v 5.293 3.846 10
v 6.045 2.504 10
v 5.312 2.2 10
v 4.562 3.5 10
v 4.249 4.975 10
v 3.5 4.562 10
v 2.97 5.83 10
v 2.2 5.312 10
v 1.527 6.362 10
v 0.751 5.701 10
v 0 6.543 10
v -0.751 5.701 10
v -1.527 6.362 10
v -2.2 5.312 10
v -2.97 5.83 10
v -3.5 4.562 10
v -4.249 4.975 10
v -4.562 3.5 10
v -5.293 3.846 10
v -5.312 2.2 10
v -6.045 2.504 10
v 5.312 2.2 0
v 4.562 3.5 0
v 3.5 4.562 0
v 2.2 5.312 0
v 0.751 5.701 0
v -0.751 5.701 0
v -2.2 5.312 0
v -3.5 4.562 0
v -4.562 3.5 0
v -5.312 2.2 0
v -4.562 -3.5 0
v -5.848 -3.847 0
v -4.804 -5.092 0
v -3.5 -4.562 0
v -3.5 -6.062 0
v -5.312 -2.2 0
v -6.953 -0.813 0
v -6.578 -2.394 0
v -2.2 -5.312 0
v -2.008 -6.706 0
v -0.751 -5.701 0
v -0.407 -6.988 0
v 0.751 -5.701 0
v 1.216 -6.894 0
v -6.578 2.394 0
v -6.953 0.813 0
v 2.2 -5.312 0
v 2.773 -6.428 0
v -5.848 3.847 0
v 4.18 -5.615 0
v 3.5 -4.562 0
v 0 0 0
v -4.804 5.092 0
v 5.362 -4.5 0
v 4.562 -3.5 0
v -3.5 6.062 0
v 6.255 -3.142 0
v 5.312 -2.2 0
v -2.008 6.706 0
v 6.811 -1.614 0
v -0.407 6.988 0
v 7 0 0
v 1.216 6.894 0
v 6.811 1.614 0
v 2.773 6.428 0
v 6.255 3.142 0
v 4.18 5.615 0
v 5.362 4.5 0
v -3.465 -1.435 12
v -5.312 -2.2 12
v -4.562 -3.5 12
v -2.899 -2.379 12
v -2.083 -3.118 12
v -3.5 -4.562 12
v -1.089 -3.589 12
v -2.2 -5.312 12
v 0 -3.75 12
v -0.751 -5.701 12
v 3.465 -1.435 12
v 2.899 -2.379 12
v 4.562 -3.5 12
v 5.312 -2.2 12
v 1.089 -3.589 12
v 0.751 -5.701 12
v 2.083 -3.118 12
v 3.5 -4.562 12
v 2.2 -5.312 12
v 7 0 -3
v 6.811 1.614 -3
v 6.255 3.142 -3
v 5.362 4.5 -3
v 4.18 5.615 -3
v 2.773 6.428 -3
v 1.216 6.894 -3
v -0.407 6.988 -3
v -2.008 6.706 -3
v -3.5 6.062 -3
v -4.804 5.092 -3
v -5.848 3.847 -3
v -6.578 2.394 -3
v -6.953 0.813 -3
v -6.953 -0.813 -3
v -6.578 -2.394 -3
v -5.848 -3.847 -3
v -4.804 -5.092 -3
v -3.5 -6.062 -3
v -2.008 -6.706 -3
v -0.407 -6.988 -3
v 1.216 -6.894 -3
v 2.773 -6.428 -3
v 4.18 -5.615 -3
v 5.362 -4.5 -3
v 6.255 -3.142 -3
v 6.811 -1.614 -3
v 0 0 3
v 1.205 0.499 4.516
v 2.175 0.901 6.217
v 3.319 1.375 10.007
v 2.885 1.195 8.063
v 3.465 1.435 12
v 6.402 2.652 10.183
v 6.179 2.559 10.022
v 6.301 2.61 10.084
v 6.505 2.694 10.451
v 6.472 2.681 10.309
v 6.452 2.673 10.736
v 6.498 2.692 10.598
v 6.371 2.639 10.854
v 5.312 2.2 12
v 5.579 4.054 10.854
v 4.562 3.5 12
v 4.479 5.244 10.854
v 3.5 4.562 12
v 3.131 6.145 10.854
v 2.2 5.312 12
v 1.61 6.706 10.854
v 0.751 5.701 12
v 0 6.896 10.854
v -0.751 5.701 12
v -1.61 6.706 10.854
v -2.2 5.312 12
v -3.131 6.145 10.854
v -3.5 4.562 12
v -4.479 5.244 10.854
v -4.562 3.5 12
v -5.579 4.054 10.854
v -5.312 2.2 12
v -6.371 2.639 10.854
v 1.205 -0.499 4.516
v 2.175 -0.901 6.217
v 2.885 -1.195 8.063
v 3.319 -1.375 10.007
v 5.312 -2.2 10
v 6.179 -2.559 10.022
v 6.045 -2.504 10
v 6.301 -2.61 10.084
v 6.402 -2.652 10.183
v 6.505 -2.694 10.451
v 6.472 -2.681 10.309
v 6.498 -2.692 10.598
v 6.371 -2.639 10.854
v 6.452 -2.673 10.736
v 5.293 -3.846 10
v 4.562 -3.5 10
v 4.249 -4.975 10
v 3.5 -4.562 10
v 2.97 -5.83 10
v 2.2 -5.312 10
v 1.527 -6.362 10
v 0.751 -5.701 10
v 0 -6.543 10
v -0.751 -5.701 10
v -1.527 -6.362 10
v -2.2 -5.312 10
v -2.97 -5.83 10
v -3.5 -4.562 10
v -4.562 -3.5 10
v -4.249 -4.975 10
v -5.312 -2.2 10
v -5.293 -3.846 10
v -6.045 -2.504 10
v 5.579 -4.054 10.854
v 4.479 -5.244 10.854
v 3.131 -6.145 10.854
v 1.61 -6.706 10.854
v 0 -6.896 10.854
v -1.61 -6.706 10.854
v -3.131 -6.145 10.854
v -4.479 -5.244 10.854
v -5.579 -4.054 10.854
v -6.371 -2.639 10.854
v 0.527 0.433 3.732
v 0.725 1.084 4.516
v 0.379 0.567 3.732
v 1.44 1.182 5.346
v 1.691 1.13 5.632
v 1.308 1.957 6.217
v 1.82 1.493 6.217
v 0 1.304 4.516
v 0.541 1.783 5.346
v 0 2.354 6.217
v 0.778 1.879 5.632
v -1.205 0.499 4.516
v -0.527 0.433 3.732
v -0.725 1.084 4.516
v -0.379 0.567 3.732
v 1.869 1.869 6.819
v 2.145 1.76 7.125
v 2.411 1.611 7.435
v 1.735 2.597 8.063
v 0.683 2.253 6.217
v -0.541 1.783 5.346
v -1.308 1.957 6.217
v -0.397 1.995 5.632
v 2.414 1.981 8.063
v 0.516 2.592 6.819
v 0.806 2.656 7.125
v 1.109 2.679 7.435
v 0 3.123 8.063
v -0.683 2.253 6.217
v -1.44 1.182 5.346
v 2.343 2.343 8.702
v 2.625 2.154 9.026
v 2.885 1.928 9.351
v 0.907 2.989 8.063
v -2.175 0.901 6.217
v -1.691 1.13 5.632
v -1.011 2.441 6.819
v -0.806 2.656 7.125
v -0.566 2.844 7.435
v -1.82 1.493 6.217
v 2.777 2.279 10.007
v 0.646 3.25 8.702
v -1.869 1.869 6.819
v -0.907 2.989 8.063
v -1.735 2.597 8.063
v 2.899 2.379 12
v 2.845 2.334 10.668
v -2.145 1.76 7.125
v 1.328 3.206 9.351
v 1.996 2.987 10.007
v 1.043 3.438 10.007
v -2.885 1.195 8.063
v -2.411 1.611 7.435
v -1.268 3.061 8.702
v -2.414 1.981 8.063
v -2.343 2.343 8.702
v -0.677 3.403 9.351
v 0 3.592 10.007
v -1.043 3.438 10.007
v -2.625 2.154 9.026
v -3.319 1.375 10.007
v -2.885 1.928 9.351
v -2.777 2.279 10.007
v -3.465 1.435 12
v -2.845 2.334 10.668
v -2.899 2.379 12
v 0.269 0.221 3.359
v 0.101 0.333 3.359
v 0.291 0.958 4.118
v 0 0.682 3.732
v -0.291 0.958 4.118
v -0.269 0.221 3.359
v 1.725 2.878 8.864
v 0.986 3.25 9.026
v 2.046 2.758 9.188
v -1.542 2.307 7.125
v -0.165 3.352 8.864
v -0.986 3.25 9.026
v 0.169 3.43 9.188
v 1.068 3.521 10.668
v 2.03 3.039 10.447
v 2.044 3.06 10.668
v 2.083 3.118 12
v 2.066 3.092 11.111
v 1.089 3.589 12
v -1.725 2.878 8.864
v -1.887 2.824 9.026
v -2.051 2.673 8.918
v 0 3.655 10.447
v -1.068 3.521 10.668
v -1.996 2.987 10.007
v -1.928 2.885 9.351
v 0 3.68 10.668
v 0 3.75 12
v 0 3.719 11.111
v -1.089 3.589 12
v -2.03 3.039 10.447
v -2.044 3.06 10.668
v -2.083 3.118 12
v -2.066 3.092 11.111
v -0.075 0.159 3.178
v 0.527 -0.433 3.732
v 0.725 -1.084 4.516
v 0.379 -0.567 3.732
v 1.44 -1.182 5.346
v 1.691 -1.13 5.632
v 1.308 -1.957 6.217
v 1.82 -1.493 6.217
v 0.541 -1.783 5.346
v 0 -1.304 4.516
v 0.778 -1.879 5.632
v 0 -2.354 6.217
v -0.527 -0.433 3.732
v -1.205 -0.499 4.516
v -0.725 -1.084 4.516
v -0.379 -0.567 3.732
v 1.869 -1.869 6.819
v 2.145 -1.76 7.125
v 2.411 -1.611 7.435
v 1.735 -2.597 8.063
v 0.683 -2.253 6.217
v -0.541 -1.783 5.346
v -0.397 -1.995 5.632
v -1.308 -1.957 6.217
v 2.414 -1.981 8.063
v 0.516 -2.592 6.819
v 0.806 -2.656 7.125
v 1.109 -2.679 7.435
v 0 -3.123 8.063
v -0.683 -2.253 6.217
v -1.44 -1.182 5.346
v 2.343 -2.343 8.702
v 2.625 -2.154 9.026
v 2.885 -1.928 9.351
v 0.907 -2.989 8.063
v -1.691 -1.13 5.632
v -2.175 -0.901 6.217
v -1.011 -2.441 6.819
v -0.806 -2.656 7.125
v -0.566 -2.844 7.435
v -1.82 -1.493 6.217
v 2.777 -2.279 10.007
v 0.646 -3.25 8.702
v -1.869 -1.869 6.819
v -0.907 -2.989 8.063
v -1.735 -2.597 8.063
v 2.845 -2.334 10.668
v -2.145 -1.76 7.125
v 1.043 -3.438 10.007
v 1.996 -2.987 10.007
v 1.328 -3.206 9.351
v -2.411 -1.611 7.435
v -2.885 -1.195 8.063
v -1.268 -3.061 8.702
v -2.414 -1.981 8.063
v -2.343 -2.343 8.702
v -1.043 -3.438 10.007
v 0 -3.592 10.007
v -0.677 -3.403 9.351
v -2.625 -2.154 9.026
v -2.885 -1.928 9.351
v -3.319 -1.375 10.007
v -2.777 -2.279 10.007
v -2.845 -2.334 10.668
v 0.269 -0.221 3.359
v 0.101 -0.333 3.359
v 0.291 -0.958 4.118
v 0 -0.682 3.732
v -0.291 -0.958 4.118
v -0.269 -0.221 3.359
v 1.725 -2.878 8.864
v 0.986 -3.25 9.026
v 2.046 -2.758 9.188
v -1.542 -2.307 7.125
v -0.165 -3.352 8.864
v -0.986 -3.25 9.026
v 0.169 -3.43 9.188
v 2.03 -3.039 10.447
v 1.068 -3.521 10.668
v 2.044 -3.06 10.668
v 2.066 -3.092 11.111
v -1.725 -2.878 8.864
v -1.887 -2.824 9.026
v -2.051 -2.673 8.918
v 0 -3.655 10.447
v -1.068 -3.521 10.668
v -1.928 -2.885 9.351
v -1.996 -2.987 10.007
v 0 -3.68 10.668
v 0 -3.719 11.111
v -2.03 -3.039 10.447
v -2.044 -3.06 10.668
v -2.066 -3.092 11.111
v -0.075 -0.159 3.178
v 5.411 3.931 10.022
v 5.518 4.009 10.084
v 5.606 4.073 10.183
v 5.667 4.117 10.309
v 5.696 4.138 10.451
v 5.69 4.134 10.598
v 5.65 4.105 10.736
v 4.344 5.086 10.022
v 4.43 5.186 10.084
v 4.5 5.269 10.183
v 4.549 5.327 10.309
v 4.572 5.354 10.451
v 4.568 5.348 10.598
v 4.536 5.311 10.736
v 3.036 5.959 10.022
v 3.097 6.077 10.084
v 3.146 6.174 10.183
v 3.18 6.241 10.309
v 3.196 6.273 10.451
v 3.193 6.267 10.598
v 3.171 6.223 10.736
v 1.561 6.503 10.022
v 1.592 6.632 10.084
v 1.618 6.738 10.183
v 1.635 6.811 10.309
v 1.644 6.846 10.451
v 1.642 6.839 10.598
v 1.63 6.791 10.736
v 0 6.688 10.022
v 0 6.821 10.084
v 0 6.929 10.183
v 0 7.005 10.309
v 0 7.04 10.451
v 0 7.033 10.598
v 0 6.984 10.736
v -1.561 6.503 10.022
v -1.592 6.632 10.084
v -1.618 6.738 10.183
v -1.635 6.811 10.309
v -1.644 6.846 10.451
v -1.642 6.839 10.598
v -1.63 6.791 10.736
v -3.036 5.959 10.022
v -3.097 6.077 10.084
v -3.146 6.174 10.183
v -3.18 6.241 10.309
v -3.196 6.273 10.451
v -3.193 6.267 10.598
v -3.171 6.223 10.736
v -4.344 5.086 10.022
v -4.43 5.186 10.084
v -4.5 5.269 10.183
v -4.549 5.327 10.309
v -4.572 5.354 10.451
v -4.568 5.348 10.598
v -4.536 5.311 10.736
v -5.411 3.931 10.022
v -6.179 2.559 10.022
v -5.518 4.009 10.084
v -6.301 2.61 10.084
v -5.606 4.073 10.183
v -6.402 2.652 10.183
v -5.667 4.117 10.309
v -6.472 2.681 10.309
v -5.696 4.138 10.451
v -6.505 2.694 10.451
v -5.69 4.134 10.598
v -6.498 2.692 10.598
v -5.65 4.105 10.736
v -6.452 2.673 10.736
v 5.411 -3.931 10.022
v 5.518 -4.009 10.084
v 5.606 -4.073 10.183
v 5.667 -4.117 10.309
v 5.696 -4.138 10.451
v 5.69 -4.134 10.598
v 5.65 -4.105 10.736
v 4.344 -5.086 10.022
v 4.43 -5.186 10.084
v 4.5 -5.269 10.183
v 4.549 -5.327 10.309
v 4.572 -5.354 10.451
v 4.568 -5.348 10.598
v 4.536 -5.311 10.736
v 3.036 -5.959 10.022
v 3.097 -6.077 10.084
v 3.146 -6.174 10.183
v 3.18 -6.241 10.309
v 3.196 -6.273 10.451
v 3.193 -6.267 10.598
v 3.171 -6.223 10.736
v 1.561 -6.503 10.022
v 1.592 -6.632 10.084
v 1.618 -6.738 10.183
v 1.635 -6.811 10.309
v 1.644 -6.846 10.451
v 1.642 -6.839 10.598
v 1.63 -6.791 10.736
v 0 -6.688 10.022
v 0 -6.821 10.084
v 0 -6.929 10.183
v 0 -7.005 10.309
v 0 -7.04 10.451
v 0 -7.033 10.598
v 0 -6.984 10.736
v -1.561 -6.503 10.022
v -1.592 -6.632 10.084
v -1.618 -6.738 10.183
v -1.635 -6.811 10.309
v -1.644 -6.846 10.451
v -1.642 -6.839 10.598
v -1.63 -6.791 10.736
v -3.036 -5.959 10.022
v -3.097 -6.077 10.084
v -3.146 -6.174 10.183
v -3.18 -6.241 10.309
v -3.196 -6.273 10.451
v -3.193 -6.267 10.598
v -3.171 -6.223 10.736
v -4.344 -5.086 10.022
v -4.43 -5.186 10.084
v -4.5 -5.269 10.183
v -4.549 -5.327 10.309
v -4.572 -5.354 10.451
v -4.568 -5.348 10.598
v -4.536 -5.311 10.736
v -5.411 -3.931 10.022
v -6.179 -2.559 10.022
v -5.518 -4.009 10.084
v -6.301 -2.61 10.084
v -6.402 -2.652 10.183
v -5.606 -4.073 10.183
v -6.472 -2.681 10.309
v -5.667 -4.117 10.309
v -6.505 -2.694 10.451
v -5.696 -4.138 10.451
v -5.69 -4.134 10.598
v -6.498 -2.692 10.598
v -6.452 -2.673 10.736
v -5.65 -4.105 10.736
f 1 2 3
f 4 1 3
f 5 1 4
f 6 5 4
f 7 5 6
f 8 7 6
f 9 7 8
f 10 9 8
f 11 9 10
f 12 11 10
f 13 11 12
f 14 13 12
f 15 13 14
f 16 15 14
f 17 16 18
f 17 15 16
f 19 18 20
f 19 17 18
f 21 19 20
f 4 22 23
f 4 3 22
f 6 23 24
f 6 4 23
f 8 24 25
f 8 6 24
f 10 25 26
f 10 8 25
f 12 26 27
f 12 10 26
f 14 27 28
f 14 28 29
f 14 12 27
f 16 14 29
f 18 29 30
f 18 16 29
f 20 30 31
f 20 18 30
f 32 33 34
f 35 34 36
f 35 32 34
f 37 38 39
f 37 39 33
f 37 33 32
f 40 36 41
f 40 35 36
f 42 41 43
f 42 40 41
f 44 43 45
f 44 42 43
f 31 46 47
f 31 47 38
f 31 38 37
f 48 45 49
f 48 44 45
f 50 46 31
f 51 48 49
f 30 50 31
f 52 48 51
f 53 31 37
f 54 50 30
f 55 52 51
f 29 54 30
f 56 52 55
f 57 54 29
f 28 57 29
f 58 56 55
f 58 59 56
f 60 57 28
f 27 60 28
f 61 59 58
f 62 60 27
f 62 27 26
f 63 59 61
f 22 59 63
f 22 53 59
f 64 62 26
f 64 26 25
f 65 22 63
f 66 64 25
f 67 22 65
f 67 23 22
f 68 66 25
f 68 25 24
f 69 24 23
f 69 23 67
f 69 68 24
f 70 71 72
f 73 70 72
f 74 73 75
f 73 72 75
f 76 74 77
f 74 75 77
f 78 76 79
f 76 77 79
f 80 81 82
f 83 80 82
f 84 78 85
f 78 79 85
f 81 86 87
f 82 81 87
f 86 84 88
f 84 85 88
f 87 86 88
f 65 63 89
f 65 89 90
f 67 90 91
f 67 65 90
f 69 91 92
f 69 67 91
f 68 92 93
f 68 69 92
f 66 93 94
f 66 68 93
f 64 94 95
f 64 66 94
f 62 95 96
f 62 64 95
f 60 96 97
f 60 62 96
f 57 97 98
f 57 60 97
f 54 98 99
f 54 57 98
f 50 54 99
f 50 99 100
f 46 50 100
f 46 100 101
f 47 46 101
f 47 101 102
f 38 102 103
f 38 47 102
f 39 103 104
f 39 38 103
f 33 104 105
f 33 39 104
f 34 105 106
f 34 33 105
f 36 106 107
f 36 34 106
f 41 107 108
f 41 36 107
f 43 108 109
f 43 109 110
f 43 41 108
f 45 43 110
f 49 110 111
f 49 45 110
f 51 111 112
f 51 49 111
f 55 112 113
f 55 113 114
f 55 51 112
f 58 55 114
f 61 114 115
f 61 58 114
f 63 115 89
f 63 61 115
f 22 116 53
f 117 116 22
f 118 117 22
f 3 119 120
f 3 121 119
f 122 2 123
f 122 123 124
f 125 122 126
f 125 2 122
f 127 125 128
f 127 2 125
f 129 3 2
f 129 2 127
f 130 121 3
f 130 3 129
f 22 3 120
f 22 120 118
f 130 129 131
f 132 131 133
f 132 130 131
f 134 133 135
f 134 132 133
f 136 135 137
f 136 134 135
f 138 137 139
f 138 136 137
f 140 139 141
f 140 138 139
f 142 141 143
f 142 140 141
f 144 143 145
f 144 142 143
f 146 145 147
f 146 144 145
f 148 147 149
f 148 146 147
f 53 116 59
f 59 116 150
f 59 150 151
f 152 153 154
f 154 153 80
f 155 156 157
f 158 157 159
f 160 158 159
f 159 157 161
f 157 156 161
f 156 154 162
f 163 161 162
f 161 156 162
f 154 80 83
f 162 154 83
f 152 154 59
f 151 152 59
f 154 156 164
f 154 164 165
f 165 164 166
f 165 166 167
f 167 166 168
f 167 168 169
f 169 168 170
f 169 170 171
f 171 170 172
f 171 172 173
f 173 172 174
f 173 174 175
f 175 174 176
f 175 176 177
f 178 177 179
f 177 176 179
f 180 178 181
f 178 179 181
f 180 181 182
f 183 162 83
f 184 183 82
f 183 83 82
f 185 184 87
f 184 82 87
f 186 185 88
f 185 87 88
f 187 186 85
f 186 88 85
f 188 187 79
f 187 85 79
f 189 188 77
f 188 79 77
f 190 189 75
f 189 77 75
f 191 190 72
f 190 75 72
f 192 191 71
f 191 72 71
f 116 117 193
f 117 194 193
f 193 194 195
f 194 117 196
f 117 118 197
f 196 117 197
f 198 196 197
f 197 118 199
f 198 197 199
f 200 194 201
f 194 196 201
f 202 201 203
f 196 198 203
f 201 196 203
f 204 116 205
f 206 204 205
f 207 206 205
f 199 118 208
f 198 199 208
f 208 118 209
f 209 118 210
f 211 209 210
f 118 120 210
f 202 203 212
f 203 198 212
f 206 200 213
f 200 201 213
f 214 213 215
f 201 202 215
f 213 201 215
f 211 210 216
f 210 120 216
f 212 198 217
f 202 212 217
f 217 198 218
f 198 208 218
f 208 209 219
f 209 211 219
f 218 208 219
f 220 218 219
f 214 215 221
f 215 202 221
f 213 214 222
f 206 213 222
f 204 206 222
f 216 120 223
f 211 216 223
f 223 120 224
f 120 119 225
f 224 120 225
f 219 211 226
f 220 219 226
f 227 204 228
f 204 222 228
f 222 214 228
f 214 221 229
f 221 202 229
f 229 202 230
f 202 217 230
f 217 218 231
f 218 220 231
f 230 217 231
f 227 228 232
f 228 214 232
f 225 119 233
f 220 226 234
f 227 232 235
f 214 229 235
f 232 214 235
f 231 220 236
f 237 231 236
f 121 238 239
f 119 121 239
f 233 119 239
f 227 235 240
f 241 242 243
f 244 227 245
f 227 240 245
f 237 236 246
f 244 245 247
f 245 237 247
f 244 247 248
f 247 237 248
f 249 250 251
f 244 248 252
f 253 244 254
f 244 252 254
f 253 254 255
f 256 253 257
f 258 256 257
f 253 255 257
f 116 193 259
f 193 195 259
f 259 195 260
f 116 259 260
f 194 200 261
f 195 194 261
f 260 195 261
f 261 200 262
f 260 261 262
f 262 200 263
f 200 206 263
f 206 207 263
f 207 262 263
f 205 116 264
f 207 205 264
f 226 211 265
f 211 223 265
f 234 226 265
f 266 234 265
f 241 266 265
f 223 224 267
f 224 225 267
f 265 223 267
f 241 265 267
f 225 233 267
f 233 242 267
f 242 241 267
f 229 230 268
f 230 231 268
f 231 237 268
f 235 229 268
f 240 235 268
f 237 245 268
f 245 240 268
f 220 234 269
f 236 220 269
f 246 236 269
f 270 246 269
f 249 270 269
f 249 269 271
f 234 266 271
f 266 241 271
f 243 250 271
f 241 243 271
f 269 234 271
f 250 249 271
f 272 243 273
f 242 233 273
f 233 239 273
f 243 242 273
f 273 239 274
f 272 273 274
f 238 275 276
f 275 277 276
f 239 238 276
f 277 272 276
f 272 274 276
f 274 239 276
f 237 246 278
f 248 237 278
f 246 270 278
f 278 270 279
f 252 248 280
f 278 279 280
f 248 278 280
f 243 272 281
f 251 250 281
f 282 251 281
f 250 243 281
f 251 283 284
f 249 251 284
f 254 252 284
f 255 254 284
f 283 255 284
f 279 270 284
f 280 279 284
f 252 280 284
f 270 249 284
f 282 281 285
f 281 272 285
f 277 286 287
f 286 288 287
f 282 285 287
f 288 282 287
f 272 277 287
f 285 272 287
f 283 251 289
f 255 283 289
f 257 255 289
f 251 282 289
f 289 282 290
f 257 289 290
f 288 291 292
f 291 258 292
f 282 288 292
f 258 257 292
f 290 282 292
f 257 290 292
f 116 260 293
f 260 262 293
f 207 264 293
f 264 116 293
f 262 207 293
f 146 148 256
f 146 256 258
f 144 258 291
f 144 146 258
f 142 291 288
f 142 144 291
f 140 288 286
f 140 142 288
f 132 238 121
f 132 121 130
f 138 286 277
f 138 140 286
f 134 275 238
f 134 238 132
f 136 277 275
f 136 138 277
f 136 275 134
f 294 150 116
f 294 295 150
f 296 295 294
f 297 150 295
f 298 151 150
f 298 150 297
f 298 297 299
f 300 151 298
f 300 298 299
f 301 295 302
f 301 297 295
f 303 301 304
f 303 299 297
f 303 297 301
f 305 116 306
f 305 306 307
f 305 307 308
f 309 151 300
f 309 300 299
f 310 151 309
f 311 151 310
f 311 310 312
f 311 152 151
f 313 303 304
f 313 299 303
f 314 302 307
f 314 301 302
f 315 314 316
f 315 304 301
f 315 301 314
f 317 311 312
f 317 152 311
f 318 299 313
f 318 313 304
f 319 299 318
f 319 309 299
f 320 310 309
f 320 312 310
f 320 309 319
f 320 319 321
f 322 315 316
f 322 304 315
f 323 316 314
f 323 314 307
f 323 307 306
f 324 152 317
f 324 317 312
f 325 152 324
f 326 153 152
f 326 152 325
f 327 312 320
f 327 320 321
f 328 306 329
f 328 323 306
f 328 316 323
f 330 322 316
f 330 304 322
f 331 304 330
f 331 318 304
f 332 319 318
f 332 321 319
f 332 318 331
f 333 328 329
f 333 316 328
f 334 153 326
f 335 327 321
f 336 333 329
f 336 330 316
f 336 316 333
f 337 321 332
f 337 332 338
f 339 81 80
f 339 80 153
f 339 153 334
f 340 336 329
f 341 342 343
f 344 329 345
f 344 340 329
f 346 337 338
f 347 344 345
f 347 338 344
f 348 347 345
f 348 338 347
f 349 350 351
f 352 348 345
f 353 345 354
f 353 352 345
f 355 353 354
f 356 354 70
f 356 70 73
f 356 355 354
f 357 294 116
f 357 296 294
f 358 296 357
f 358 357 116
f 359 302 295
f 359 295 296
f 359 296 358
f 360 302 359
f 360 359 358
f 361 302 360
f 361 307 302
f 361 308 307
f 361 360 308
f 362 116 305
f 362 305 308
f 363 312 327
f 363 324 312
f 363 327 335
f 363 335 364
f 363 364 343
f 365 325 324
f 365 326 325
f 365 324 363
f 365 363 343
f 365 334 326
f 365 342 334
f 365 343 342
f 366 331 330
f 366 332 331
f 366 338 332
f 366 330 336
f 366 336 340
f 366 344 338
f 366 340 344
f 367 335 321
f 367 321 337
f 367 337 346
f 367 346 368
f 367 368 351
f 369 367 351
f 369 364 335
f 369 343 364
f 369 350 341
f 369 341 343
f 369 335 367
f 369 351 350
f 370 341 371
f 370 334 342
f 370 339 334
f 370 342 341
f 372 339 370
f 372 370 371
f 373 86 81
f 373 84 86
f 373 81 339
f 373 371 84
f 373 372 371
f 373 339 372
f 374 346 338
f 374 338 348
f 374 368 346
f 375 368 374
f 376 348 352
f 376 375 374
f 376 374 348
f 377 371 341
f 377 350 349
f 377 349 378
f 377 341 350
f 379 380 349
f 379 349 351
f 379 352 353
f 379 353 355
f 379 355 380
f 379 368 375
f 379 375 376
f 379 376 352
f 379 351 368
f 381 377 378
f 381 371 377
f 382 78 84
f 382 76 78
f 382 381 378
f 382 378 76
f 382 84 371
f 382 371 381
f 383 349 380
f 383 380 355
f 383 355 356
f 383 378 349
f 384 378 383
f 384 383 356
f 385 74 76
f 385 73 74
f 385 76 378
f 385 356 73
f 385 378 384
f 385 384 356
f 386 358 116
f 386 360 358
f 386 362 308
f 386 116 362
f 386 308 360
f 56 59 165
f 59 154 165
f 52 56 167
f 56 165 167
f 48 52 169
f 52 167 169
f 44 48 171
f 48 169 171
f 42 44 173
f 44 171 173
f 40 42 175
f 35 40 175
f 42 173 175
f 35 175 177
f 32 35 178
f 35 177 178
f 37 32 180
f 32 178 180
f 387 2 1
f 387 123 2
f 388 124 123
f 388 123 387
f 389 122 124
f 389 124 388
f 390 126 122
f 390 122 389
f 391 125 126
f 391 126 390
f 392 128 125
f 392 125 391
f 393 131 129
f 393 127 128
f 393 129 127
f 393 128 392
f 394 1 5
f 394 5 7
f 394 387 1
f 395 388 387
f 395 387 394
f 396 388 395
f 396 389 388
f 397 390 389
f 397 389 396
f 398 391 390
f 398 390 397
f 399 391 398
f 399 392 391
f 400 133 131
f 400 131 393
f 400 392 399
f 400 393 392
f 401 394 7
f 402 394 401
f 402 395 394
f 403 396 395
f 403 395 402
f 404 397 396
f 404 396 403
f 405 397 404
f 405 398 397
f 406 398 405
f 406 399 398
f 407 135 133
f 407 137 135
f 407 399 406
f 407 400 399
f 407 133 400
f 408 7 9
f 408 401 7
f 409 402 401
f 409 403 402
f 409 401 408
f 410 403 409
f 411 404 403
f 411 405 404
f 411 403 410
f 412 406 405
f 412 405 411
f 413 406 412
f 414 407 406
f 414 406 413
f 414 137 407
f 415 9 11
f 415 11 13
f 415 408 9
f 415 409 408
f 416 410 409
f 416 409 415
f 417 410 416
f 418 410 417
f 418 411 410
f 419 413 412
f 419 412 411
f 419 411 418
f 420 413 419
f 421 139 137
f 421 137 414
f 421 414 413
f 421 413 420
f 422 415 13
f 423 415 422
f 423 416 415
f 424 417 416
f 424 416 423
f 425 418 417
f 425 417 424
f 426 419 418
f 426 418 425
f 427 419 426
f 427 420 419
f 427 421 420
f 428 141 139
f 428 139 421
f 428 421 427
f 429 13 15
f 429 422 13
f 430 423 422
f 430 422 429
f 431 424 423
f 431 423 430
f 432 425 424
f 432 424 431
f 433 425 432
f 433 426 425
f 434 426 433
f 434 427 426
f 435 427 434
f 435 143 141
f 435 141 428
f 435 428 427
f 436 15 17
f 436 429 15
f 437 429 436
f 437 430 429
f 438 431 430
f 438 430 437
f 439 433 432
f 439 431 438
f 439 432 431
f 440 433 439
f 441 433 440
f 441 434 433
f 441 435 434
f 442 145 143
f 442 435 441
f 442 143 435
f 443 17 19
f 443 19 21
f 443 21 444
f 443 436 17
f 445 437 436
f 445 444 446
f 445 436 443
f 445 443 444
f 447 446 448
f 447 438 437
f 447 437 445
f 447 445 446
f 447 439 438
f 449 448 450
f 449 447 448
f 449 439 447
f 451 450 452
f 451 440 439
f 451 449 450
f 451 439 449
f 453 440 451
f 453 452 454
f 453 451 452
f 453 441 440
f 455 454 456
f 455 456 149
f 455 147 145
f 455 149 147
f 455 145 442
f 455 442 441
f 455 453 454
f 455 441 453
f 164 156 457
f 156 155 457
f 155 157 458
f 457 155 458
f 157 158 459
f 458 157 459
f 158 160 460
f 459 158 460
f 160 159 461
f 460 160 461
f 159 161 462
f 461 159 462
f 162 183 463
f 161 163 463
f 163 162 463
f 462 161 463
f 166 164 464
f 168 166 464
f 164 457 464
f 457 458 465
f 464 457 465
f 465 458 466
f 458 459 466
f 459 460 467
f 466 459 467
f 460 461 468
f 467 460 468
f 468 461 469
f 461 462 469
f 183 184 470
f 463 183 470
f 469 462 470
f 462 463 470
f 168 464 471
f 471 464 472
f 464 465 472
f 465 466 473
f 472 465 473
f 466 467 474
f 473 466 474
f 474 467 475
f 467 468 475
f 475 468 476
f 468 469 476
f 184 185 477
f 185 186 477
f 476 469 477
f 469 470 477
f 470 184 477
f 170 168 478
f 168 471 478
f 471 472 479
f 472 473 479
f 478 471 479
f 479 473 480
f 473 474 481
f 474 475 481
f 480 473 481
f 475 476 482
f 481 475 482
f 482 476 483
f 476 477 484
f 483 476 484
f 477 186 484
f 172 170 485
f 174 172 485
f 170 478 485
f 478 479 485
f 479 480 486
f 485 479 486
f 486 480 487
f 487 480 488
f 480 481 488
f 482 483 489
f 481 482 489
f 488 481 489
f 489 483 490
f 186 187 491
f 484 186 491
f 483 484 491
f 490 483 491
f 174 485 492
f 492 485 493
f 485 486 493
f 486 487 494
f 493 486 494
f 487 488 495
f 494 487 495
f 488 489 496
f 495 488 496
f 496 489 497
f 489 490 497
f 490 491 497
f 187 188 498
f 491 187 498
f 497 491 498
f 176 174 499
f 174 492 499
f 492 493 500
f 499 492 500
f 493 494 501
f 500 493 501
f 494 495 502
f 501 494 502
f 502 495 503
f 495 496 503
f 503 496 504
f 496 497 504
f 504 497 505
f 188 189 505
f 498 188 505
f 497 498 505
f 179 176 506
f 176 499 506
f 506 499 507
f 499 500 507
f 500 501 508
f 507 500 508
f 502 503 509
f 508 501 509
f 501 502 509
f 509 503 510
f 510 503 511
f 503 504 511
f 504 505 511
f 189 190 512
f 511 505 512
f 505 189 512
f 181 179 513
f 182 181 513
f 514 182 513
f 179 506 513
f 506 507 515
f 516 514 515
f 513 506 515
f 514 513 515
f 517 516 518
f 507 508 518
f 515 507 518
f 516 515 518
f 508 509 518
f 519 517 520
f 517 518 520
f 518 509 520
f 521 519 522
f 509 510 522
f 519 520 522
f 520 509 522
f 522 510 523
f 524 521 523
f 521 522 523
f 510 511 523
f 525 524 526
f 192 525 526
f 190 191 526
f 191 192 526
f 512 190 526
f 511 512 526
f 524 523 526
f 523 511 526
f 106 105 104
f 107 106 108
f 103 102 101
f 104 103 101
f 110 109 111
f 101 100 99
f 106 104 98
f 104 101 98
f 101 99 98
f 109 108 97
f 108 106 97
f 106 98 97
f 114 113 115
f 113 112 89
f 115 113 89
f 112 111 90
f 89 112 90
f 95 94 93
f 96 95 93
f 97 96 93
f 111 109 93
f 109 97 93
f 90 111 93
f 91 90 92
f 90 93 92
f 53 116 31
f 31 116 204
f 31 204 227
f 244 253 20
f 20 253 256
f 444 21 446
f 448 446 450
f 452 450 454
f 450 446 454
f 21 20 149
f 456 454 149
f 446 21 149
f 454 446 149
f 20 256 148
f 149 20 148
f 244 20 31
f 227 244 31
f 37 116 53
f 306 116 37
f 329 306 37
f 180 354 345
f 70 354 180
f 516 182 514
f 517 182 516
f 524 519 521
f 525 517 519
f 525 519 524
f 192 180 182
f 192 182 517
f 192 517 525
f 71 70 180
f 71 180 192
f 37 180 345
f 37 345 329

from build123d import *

# Parameters (mm, degrees)
SKETCH008_R         = 7
PAD002_DEPTH        = 3
REVOLUTION001_ANGLE = -135


with BuildPart() as part:
    # Sketch008 → Pad002 (new body)
    with BuildSketch(Plane.XY):
        Circle(SKETCH008_R)
    extrude(amount=-PAD002_DEPTH)

    # Sketch007 → Revolution001 (revolve)
    with BuildSketch(Plane(origin=(0, 0, 0), x_dir=(0.92388, -0.382683, 0), z_dir=(-0.382683, -0.92388, 0))):
        with BuildLine():
            Line((5.75, 0), (5.75, 10))
            Line((5.75, 10), (6.542893, 10))
            ThreePointArc((6.542893, 10), (7.004833, 10.308658), (6.896447, 10.853553))
            Line((6.896447, 10.853553), (5.75, 12))
            Line((5.75, 12), (3.75, 12))
            ThreePointArc((0, 3), (2.775, 7.125), (3.75, 12))
            Line((0, 0), (0, 3))
            Line((5.75, 0), (0, 0))
        make_face()
    revolution001 = revolve(axis=Axis((0, 0, 0), (0, 0, 1)), revolution_arc=REVOLUTION001_ANGLE)

    # Mirrored001: Revolution001 across XZ
    add(revolution001.mirror(Plane.XZ))


solid = part.part
